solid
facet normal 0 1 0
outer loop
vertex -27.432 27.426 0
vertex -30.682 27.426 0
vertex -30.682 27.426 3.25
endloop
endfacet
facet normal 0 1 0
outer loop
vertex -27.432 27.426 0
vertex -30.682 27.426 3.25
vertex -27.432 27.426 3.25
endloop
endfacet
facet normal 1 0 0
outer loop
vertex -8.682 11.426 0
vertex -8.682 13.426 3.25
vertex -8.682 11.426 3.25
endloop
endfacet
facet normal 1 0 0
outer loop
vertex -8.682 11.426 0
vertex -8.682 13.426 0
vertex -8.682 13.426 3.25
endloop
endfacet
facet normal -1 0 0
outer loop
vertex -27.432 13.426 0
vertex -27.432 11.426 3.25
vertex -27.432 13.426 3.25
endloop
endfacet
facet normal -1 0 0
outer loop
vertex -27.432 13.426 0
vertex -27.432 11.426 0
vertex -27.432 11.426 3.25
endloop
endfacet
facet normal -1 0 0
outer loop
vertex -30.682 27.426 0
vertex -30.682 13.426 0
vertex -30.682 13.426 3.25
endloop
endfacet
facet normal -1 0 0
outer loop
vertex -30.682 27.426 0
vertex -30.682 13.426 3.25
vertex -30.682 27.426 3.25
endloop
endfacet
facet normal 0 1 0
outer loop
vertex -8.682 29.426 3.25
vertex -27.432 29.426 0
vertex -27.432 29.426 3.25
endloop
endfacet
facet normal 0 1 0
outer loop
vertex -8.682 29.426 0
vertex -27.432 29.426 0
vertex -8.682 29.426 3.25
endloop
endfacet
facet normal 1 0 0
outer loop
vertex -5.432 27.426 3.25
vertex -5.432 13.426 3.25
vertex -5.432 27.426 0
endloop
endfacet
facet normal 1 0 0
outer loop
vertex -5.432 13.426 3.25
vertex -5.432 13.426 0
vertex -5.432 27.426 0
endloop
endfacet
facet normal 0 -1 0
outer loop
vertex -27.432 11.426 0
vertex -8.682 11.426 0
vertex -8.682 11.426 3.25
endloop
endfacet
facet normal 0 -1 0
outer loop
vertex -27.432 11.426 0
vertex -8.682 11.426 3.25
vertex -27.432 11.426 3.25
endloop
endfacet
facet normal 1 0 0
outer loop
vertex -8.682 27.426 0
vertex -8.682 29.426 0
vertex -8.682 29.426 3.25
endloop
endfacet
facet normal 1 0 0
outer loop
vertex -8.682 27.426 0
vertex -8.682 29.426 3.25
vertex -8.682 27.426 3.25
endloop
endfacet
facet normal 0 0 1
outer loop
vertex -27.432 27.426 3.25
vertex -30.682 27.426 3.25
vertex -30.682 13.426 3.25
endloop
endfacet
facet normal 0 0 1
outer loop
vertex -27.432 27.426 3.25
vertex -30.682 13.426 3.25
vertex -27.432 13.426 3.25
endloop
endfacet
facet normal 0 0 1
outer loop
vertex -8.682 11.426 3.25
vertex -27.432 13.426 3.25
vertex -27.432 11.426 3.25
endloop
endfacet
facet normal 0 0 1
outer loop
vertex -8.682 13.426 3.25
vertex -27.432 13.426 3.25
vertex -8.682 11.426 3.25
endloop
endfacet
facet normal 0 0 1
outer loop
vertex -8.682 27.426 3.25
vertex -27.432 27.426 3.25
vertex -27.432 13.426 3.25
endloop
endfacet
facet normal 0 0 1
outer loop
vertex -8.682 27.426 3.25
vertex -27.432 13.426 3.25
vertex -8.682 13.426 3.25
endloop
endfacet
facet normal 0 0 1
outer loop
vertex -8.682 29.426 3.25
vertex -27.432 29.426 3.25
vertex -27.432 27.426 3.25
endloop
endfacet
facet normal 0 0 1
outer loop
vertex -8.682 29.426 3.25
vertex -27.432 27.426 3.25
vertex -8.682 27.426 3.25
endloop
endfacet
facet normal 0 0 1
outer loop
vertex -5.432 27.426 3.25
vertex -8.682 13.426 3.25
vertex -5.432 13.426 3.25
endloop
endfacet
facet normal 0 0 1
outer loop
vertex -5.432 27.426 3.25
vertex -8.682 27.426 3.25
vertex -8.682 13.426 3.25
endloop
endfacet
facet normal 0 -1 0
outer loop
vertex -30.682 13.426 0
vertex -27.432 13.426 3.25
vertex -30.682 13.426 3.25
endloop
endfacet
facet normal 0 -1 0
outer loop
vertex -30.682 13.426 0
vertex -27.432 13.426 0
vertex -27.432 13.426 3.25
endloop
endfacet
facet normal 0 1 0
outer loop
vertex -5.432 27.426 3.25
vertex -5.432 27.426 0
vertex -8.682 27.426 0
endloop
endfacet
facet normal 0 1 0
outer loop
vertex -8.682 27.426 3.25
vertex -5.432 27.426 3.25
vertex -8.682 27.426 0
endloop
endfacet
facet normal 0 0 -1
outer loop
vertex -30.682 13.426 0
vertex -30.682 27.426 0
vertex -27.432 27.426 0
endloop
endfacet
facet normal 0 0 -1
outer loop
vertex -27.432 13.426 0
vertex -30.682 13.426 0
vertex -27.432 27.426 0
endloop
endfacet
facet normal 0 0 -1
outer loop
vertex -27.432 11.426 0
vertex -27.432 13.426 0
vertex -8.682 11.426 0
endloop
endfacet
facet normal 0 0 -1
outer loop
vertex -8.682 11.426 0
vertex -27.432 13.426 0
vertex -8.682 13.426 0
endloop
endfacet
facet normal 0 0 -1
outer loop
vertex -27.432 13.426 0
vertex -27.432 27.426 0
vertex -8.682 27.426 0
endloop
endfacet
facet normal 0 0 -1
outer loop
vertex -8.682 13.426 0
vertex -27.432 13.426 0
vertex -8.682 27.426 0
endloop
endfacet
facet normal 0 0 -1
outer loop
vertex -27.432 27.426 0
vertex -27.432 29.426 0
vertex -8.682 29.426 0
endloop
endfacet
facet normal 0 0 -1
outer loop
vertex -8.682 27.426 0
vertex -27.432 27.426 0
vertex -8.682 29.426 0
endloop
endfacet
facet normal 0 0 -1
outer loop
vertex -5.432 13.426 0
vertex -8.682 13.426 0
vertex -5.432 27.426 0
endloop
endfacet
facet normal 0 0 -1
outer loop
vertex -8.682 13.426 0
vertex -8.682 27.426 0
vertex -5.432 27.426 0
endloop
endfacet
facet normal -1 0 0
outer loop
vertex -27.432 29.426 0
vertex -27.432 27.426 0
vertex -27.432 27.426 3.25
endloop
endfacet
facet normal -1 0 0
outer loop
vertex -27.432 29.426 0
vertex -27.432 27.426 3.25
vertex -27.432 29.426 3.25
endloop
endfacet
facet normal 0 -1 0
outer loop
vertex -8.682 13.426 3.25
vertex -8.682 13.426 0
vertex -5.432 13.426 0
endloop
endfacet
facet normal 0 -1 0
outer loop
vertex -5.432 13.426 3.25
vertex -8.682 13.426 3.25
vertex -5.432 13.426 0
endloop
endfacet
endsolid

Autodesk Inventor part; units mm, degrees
ref_plane "YZ Plane" through (0, 0, 0) normal (1, 0, 0) x (0, 1, 0)
ref_plane "XZ Plane" through (0, 0, 0) normal (0, 1, 0) x (-1, 0, 0)
ref_plane "XY Plane" through (0, 0, 0) normal (0, 0, 1) x (1, 0, 0)
sketch "Block1" plane through (0, 0, 0) normal (0, 0, 1) x (1, 0, 0)
  circle A0 centre (74.029, 24.2723) radius 1
  line L0 (49.279, 30.4723) -> (71.779, 30.4723)
  line L1 (71.779, 30.4723) -> (71.779, 18.0723)
  line L2 (71.779, 18.0723) -> (49.279, 18.0723)
  line L3 (49.279, 18.0723) -> (49.279, 30.4723)
  line L4 (49.279, 30.4723) -> (44.779, 30.4723)
  line L5 (44.779, 30.4723) -> (44.779, 18.0723)
  line L6 (44.779, 18.0723) -> (49.279, 18.0723)
  line L7 (49.279, 18.0723) -> (49.279, 30.4723)
  line L8 (71.779, 30.4723) -> (76.279, 30.4723)
  line L9 (76.279, 30.4723) -> (76.279, 18.0723)
  line L10 (76.279, 18.0723) -> (71.779, 18.0723)
  line L11 (71.779, 18.0723) -> (71.779, 30.4723)
  line L12 (44.779, 24.2723) -> (76.279, 24.2723) construction
  line L13 (47.029, 30.4723) -> (47.029, 18.0723) construction
  circle A1 centre (47.029, 24.2723) radius 1
  line L14 (74.029, 30.4723) -> (74.029, 18.0723) construction
  point P0 (60.979, 24.0984)
  dimension "d7" = 22.5
  dimension "d8" = 12.4
  dimension "d9" = 4.5
  dimension "d10" = 4.5
  dimension "d11" = 2
  dimension "d12" = 2
sketch "Sketch1" plane through (0, 0, 0) normal (0, 0, 1) x (1, 0, 0)
  line L0 (-92.7646, -8.503) -> (-89.7646, -8.503)
  line L1 (-89.7646, -8.503) -> (-89.7646, -11.753)
  line L2 (-89.7646, -11.753) -> (-92.7646, -11.753)
  line L3 (-92.7646, -11.753) -> (-92.7646, -8.503)
  line L4 (-92.7646, -21.6527) -> (-89.7646, -21.6527)
  line L5 (-89.7646, -21.6527) -> (-89.7646, -21.7527)
  line L6 (-89.7646, -21.7527) -> (-92.7646, -21.7527)
  line L7 (-92.7646, -21.7527) -> (-92.7646, -21.6527)
  line L8 (-27.4321, 29.4262) -> (-8.6821, 29.4262)
  line L9 (-8.6821, 29.4262) -> (-8.6821, 11.4262)
  line L10 (-8.6821, 11.4262) -> (-27.4321, 11.4262)
  line L11 (-27.4321, 11.4262) -> (-27.4321, 29.4262)
  line L12 (-27.4321, 20.4262) -> (-8.6821, 20.4262) construction
  line L13 (-30.6821, 27.4262) -> (-27.4321, 27.4262)
  line L14 (-27.4321, 27.4262) -> (-27.4321, 13.4262)
  line L15 (-27.4321, 13.4262) -> (-30.6821, 13.4262)
  line L16 (-30.6821, 13.4262) -> (-30.6821, 27.4262)
  line L17 (-30.6821, 20.4262) -> (-27.4321, 20.4262) construction
  line L18 (-18.0571, 29.4262) -> (-18.0571, 11.4262) construction
  line L19 (-5.4321, 27.4262) -> (-8.6821, 27.4262)
  line L20 (-8.6821, 27.4262) -> (-8.6821, 13.4262)
  line L21 (-8.6821, 13.4262) -> (-5.4321, 13.4262)
  line L22 (-5.4321, 13.4262) -> (-5.4321, 27.4262)
  line L23 (-5.4321, 20.4262) -> (-8.6821, 20.4262) construction
  point P0 (0, 0)
  dimension "d0" = 3
  dimension "mat" = 3.25
  dimension "d2" = 3
  dimension "d3" = 0.1
  dimension "d36" = 18.75
  dimension "d37" = 18
  dimension "d38" = 3.25
  dimension "d39" = 14
extrude "Extrusion4" add sketch "Sketch1" along normal blind 3.25 contours L8 L9 L10 L11 | L11 L15 L16 L13 | L19 L22 L21 L9
equation "\"d38\" = mat"
equation "\"d40\" = mat"
properties part number "arm-servo"
